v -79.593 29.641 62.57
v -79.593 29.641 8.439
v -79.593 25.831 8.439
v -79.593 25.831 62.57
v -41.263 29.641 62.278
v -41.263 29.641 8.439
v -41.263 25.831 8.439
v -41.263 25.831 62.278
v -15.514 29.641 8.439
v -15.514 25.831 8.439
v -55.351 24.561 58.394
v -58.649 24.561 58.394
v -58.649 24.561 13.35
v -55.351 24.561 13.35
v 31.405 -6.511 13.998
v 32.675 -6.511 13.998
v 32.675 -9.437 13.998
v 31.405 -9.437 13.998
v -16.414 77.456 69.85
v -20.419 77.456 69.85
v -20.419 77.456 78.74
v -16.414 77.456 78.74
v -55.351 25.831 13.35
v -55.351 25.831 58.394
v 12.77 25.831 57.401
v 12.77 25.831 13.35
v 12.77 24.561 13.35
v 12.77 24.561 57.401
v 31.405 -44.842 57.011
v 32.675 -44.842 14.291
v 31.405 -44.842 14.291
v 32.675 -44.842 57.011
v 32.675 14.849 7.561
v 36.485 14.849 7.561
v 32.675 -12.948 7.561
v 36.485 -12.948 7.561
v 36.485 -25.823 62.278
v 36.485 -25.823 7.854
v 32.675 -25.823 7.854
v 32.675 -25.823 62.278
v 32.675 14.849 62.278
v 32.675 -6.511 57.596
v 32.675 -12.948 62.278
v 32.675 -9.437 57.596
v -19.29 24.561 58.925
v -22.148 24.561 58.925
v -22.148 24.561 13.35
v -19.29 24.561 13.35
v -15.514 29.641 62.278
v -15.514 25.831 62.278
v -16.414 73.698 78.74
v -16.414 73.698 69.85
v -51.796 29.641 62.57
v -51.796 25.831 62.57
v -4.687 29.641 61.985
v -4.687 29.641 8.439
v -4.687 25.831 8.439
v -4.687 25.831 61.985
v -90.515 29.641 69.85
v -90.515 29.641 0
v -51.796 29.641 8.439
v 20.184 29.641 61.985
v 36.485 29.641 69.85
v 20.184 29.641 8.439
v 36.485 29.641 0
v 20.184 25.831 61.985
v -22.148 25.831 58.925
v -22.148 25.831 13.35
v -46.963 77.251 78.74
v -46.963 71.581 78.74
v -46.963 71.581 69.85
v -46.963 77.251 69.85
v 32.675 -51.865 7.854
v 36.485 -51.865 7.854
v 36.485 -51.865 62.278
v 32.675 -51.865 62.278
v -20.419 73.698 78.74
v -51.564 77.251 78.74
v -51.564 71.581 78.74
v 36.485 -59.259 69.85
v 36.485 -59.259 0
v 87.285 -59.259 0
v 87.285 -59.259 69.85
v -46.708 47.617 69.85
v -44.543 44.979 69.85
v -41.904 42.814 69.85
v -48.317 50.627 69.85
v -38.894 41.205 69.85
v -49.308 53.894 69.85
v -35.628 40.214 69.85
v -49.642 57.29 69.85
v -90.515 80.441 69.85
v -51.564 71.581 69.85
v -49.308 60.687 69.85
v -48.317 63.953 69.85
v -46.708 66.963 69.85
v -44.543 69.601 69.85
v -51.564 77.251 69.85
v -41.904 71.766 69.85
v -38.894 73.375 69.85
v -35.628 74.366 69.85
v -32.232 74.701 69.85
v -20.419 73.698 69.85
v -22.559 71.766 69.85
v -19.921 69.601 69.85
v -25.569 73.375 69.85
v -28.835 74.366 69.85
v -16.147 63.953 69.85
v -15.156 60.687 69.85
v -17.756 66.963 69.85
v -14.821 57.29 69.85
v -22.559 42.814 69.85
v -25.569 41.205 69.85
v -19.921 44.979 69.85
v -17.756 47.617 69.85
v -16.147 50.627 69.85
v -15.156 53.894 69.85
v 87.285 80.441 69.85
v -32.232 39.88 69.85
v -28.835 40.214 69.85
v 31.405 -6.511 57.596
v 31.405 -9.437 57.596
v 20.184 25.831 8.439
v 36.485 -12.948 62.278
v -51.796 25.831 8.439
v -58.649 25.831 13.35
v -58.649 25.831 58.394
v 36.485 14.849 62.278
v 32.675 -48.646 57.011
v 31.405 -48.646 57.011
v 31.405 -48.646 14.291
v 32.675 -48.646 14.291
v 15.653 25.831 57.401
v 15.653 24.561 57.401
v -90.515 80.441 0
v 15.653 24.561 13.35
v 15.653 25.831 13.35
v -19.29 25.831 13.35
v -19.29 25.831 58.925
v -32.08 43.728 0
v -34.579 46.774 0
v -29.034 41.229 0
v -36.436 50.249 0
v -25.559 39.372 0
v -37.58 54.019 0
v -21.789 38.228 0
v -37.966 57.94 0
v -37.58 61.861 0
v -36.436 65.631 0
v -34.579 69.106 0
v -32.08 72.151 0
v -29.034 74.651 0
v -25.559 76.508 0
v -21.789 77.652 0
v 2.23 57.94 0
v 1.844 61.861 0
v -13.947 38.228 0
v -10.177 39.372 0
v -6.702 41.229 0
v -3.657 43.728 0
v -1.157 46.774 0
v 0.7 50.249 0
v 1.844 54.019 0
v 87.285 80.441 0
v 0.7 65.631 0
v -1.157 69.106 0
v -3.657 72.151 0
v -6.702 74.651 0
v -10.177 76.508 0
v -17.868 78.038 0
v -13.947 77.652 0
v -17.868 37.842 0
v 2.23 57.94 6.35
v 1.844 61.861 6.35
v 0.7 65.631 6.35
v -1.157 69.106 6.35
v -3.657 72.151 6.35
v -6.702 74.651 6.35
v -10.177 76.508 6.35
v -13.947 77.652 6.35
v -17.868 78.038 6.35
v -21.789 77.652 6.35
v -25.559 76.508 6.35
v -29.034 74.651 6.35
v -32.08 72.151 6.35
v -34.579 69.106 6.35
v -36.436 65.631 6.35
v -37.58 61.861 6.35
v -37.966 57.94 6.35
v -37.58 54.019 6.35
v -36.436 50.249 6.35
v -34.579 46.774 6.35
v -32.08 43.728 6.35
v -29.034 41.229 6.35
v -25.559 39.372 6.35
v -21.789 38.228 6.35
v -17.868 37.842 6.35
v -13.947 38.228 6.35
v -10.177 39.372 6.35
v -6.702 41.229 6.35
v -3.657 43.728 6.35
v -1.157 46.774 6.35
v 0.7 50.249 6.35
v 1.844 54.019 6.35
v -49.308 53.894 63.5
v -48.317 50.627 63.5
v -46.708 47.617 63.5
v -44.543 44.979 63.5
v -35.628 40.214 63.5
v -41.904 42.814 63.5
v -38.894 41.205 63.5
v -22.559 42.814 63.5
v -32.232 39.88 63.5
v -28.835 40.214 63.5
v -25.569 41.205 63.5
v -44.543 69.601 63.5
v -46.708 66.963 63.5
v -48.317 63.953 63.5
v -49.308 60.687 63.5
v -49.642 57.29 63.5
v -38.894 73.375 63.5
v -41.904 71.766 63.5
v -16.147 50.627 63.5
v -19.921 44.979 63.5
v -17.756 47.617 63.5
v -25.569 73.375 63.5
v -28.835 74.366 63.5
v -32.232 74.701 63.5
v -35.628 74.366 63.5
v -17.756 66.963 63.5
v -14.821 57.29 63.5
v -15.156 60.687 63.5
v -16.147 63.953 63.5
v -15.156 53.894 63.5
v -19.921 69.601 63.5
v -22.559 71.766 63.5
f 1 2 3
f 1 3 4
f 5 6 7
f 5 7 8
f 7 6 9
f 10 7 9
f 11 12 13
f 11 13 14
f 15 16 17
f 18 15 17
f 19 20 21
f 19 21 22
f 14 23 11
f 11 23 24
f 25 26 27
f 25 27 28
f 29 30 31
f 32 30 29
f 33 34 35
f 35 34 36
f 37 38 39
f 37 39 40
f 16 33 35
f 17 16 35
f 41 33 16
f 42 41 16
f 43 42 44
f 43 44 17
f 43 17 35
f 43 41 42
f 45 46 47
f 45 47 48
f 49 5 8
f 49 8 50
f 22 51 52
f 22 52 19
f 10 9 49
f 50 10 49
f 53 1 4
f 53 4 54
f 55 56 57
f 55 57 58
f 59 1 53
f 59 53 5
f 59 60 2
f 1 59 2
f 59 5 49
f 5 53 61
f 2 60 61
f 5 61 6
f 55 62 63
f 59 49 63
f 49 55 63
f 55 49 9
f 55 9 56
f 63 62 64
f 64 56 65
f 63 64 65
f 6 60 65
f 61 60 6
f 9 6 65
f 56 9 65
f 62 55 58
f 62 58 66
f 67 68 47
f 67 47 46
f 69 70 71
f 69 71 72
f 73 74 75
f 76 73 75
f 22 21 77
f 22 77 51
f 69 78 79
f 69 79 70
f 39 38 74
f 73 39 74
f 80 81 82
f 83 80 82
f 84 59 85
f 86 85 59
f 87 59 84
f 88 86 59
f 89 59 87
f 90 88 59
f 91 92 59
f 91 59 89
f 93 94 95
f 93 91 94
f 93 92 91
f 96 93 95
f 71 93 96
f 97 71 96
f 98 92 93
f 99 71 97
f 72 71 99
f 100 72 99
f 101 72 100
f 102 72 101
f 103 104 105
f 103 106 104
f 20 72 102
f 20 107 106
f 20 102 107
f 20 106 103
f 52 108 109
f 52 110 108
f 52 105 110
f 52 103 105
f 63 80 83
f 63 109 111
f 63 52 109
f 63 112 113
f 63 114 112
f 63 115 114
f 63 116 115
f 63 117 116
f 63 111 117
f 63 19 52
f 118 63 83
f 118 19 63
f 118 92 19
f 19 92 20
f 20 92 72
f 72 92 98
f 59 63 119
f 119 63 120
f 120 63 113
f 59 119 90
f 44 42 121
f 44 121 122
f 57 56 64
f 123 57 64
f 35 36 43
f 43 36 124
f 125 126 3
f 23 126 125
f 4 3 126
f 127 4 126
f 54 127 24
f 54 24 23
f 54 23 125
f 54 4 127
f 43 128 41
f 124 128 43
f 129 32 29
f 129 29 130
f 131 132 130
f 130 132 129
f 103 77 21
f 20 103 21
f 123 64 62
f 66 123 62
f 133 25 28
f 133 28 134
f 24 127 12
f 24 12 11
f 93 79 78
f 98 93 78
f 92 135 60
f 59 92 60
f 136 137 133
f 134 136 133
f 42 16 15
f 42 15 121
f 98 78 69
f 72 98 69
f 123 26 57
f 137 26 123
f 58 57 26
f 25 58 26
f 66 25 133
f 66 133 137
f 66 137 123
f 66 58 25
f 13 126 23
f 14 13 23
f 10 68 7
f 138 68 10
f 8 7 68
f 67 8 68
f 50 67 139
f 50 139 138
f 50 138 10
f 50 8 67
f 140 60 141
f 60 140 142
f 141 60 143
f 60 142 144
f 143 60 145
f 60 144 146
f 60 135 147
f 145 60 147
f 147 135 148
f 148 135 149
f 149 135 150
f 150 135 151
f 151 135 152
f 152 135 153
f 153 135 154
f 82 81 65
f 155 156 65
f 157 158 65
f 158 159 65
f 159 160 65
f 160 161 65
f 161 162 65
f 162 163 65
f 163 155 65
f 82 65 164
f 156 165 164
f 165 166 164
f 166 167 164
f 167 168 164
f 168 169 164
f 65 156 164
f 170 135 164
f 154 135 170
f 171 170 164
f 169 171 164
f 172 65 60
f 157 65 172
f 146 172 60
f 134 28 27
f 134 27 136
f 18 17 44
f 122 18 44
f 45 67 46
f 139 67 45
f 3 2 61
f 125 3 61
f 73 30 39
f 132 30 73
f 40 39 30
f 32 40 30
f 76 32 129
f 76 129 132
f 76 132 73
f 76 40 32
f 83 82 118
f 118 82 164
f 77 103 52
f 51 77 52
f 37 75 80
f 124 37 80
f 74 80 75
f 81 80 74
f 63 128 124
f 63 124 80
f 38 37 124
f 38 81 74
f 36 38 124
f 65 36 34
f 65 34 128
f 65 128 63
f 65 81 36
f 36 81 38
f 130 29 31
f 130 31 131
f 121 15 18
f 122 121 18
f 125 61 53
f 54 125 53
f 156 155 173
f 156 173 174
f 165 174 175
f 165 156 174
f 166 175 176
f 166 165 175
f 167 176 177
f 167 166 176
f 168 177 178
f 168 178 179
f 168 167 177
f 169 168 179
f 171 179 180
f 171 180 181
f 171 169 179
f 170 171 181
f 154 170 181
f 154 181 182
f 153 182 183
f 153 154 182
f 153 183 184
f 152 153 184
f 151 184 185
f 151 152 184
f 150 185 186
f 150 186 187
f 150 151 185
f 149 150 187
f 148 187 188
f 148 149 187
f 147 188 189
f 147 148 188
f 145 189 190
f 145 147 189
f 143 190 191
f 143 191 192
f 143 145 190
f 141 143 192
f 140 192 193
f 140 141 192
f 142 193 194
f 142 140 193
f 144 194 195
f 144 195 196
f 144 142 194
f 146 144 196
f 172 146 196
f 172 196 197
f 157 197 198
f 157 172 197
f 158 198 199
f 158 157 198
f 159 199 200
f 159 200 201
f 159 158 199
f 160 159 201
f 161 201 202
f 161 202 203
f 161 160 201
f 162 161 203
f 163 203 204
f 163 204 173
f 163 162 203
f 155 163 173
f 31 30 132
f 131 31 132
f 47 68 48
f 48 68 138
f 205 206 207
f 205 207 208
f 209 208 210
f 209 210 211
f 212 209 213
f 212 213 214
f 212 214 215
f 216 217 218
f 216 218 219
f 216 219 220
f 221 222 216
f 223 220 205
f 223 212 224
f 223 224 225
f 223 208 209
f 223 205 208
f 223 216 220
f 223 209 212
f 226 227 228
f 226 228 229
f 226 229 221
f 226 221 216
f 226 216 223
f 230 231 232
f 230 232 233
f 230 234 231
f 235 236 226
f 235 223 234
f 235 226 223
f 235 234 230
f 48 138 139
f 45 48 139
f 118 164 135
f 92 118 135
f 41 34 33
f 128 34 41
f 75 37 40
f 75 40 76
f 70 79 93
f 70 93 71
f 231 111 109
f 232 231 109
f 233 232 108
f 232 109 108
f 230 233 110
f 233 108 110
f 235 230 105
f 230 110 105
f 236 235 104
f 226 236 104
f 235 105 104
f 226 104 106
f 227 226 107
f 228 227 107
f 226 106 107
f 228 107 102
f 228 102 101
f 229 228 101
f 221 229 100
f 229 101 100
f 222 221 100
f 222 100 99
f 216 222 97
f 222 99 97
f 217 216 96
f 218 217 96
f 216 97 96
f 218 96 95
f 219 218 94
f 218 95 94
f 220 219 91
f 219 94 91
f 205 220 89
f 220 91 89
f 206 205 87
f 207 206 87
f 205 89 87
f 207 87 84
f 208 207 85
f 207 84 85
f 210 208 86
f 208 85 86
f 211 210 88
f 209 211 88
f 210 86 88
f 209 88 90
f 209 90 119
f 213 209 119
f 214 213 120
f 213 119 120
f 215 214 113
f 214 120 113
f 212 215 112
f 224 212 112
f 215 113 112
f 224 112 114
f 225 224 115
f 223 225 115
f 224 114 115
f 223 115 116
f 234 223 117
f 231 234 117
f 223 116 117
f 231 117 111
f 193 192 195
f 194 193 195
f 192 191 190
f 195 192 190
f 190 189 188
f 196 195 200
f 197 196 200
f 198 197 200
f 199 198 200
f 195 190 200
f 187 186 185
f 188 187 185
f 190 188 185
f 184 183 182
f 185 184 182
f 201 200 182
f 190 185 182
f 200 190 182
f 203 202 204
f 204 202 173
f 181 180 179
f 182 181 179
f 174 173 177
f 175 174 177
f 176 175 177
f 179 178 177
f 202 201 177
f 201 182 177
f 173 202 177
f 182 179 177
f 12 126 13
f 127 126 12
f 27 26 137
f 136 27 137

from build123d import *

# Parameters (mm, degrees)
F0_W      = 50.8
F0_H      = 88.9000027377
F1_DEPTH  = 69.85
F2_R      = 20.0980289244
F3_DEPTH  = 6.35
F4_R      = 17.4104320073
F5_DEPTH  = 6.35
F6_W      = 4.6012029052
F6_H      = 5.6705921888
F6_W_2    = 4.0045529604
F6_H_2    = 3.7587732077
F7_DEPTH  = 8.89
F8_W      = 27.7972370386
F8_H      = 54.1314678267
F8_W_2    = 25.7490221411
F8_H_2    = 53.8388649002
F8_W_3    = 24.8712147586
F8_H_3    = 53.5462619737
F9_DEPTH  = 3.81
F10_W     = 27.7972389013
F10_H     = 54.7166722827
F10_W_2   = 26.0416157544
F10_H_2   = 54.4240698218
F11_DEPTH = 3.81
F12_W     = 3.2980442047
F12_H     = 45.0437162071
F12_W_2   = 2.8579700738
F12_H_2   = 45.5747190863
F12_W_3   = 2.8833756223
F12_H_3   = 44.0509710461
F13_DEPTH = 5.08
F14_W     = 2.9260246083
F14_H     = 43.5977773741
F14_W_2   = 3.8038305938
F14_H_2   = 42.7199658006
F15_DEPTH = 5.08


with BuildPart() as f1:
    # F0 (on Top) → F1 (new body)
    with BuildSketch(Plane.XY):
        Polygon((87.2851201832, 80.4412277794), (-90.5148798168, 80.4412277794), (-90.5148798168, 29.6412277794), (36.4851201832, 29.6412277794), (87.2851201832, 29.6412277794), align=None)
        with Locations((61.8851201832, -14.8087735895)):
            Rectangle(F0_W, F0_H)
    extrude(amount=F1_DEPTH)

    # F2 (on Top) → F3 (cut)
    with BuildSketch(Plane.XY):
        with Locations((-17.8680513054, 57.9398013651)):
            Circle(F2_R)
    extrude(amount=F3_DEPTH, mode=Mode.SUBTRACT)

    # F4 (on face) → F5 (cut)
    with BuildSketch(Plane.XY.offset(69.85)):
        with Locations((-32.23175928, 57.2901628911)):
            Circle(F4_R)
    extrude(amount=-F5_DEPTH, mode=Mode.SUBTRACT)

    # F6 (on face) → F7 (join)
    with BuildSketch(Plane.XY.offset(69.85)):
        with Locations((-49.2636710405, 74.4159296155)):
            Rectangle(F6_W, F6_H)
        with Locations((-18.4165723622, 75.5769610405)):
            Rectangle(F6_W_2, F6_H_2)
    extrude(amount=F7_DEPTH)

    # F8 (on face) → F9 (join)
    with BuildSketch(Plane.XZ.offset(-29.6412277794)):
        with Locations((-65.6948313117, 35.5044952594)):
            Rectangle(F8_W, F8_H)
        with Locations((-28.3880112693, 35.3581937961)):
            Rectangle(F8_W_2, F8_H_2)
        with Locations((7.7484010253, 35.2118923329)):
            Rectangle(F8_W_3, F8_H_3)
    extrude(amount=F9_DEPTH)

    # F10 (on face) → F11 (join)
    with BuildSketch(Plane(origin=(36.4851201832, 0, 0), x_dir=(0, -1, 0), z_dir=(-1, 0, 0))):
        with Locations((-0.9502042085, 34.9192901049)):
            Rectangle(F10_W, F10_H)
        with Locations((38.8437379152, 35.0655913353)):
            Rectangle(F10_W_2, F10_H_2)
    extrude(amount=F11_DEPTH)

    # F12 (on face) → F13 (join)
    with BuildSketch(Plane.XZ.offset(-29.6412277794)):
        with Locations((-56.999836117, 35.8716500923)):
            Rectangle(F12_W, F12_H)
        with Locations((-20.7188213244, 36.1371515319)):
            Rectangle(F12_W_2, F12_H_2)
        with Locations((14.2113375477, 35.3752775118)):
            Rectangle(F12_W_3, F12_H_3)
    extrude(amount=F13_DEPTH)

    # F14 (on face) → F15 (join)
    with BuildSketch(Plane(origin=(36.4851201832, 0, 0), x_dir=(0, -1, 0), z_dir=(-1, 0, 0))):
        with Locations((7.9741724767, 35.7970981859)):
            Rectangle(F14_W, F14_H)
        with Locations((46.7440057546, 35.6507943943)):
            Rectangle(F14_W_2, F14_H_2)
    extrude(amount=F15_DEPTH)


solid = f1.part
